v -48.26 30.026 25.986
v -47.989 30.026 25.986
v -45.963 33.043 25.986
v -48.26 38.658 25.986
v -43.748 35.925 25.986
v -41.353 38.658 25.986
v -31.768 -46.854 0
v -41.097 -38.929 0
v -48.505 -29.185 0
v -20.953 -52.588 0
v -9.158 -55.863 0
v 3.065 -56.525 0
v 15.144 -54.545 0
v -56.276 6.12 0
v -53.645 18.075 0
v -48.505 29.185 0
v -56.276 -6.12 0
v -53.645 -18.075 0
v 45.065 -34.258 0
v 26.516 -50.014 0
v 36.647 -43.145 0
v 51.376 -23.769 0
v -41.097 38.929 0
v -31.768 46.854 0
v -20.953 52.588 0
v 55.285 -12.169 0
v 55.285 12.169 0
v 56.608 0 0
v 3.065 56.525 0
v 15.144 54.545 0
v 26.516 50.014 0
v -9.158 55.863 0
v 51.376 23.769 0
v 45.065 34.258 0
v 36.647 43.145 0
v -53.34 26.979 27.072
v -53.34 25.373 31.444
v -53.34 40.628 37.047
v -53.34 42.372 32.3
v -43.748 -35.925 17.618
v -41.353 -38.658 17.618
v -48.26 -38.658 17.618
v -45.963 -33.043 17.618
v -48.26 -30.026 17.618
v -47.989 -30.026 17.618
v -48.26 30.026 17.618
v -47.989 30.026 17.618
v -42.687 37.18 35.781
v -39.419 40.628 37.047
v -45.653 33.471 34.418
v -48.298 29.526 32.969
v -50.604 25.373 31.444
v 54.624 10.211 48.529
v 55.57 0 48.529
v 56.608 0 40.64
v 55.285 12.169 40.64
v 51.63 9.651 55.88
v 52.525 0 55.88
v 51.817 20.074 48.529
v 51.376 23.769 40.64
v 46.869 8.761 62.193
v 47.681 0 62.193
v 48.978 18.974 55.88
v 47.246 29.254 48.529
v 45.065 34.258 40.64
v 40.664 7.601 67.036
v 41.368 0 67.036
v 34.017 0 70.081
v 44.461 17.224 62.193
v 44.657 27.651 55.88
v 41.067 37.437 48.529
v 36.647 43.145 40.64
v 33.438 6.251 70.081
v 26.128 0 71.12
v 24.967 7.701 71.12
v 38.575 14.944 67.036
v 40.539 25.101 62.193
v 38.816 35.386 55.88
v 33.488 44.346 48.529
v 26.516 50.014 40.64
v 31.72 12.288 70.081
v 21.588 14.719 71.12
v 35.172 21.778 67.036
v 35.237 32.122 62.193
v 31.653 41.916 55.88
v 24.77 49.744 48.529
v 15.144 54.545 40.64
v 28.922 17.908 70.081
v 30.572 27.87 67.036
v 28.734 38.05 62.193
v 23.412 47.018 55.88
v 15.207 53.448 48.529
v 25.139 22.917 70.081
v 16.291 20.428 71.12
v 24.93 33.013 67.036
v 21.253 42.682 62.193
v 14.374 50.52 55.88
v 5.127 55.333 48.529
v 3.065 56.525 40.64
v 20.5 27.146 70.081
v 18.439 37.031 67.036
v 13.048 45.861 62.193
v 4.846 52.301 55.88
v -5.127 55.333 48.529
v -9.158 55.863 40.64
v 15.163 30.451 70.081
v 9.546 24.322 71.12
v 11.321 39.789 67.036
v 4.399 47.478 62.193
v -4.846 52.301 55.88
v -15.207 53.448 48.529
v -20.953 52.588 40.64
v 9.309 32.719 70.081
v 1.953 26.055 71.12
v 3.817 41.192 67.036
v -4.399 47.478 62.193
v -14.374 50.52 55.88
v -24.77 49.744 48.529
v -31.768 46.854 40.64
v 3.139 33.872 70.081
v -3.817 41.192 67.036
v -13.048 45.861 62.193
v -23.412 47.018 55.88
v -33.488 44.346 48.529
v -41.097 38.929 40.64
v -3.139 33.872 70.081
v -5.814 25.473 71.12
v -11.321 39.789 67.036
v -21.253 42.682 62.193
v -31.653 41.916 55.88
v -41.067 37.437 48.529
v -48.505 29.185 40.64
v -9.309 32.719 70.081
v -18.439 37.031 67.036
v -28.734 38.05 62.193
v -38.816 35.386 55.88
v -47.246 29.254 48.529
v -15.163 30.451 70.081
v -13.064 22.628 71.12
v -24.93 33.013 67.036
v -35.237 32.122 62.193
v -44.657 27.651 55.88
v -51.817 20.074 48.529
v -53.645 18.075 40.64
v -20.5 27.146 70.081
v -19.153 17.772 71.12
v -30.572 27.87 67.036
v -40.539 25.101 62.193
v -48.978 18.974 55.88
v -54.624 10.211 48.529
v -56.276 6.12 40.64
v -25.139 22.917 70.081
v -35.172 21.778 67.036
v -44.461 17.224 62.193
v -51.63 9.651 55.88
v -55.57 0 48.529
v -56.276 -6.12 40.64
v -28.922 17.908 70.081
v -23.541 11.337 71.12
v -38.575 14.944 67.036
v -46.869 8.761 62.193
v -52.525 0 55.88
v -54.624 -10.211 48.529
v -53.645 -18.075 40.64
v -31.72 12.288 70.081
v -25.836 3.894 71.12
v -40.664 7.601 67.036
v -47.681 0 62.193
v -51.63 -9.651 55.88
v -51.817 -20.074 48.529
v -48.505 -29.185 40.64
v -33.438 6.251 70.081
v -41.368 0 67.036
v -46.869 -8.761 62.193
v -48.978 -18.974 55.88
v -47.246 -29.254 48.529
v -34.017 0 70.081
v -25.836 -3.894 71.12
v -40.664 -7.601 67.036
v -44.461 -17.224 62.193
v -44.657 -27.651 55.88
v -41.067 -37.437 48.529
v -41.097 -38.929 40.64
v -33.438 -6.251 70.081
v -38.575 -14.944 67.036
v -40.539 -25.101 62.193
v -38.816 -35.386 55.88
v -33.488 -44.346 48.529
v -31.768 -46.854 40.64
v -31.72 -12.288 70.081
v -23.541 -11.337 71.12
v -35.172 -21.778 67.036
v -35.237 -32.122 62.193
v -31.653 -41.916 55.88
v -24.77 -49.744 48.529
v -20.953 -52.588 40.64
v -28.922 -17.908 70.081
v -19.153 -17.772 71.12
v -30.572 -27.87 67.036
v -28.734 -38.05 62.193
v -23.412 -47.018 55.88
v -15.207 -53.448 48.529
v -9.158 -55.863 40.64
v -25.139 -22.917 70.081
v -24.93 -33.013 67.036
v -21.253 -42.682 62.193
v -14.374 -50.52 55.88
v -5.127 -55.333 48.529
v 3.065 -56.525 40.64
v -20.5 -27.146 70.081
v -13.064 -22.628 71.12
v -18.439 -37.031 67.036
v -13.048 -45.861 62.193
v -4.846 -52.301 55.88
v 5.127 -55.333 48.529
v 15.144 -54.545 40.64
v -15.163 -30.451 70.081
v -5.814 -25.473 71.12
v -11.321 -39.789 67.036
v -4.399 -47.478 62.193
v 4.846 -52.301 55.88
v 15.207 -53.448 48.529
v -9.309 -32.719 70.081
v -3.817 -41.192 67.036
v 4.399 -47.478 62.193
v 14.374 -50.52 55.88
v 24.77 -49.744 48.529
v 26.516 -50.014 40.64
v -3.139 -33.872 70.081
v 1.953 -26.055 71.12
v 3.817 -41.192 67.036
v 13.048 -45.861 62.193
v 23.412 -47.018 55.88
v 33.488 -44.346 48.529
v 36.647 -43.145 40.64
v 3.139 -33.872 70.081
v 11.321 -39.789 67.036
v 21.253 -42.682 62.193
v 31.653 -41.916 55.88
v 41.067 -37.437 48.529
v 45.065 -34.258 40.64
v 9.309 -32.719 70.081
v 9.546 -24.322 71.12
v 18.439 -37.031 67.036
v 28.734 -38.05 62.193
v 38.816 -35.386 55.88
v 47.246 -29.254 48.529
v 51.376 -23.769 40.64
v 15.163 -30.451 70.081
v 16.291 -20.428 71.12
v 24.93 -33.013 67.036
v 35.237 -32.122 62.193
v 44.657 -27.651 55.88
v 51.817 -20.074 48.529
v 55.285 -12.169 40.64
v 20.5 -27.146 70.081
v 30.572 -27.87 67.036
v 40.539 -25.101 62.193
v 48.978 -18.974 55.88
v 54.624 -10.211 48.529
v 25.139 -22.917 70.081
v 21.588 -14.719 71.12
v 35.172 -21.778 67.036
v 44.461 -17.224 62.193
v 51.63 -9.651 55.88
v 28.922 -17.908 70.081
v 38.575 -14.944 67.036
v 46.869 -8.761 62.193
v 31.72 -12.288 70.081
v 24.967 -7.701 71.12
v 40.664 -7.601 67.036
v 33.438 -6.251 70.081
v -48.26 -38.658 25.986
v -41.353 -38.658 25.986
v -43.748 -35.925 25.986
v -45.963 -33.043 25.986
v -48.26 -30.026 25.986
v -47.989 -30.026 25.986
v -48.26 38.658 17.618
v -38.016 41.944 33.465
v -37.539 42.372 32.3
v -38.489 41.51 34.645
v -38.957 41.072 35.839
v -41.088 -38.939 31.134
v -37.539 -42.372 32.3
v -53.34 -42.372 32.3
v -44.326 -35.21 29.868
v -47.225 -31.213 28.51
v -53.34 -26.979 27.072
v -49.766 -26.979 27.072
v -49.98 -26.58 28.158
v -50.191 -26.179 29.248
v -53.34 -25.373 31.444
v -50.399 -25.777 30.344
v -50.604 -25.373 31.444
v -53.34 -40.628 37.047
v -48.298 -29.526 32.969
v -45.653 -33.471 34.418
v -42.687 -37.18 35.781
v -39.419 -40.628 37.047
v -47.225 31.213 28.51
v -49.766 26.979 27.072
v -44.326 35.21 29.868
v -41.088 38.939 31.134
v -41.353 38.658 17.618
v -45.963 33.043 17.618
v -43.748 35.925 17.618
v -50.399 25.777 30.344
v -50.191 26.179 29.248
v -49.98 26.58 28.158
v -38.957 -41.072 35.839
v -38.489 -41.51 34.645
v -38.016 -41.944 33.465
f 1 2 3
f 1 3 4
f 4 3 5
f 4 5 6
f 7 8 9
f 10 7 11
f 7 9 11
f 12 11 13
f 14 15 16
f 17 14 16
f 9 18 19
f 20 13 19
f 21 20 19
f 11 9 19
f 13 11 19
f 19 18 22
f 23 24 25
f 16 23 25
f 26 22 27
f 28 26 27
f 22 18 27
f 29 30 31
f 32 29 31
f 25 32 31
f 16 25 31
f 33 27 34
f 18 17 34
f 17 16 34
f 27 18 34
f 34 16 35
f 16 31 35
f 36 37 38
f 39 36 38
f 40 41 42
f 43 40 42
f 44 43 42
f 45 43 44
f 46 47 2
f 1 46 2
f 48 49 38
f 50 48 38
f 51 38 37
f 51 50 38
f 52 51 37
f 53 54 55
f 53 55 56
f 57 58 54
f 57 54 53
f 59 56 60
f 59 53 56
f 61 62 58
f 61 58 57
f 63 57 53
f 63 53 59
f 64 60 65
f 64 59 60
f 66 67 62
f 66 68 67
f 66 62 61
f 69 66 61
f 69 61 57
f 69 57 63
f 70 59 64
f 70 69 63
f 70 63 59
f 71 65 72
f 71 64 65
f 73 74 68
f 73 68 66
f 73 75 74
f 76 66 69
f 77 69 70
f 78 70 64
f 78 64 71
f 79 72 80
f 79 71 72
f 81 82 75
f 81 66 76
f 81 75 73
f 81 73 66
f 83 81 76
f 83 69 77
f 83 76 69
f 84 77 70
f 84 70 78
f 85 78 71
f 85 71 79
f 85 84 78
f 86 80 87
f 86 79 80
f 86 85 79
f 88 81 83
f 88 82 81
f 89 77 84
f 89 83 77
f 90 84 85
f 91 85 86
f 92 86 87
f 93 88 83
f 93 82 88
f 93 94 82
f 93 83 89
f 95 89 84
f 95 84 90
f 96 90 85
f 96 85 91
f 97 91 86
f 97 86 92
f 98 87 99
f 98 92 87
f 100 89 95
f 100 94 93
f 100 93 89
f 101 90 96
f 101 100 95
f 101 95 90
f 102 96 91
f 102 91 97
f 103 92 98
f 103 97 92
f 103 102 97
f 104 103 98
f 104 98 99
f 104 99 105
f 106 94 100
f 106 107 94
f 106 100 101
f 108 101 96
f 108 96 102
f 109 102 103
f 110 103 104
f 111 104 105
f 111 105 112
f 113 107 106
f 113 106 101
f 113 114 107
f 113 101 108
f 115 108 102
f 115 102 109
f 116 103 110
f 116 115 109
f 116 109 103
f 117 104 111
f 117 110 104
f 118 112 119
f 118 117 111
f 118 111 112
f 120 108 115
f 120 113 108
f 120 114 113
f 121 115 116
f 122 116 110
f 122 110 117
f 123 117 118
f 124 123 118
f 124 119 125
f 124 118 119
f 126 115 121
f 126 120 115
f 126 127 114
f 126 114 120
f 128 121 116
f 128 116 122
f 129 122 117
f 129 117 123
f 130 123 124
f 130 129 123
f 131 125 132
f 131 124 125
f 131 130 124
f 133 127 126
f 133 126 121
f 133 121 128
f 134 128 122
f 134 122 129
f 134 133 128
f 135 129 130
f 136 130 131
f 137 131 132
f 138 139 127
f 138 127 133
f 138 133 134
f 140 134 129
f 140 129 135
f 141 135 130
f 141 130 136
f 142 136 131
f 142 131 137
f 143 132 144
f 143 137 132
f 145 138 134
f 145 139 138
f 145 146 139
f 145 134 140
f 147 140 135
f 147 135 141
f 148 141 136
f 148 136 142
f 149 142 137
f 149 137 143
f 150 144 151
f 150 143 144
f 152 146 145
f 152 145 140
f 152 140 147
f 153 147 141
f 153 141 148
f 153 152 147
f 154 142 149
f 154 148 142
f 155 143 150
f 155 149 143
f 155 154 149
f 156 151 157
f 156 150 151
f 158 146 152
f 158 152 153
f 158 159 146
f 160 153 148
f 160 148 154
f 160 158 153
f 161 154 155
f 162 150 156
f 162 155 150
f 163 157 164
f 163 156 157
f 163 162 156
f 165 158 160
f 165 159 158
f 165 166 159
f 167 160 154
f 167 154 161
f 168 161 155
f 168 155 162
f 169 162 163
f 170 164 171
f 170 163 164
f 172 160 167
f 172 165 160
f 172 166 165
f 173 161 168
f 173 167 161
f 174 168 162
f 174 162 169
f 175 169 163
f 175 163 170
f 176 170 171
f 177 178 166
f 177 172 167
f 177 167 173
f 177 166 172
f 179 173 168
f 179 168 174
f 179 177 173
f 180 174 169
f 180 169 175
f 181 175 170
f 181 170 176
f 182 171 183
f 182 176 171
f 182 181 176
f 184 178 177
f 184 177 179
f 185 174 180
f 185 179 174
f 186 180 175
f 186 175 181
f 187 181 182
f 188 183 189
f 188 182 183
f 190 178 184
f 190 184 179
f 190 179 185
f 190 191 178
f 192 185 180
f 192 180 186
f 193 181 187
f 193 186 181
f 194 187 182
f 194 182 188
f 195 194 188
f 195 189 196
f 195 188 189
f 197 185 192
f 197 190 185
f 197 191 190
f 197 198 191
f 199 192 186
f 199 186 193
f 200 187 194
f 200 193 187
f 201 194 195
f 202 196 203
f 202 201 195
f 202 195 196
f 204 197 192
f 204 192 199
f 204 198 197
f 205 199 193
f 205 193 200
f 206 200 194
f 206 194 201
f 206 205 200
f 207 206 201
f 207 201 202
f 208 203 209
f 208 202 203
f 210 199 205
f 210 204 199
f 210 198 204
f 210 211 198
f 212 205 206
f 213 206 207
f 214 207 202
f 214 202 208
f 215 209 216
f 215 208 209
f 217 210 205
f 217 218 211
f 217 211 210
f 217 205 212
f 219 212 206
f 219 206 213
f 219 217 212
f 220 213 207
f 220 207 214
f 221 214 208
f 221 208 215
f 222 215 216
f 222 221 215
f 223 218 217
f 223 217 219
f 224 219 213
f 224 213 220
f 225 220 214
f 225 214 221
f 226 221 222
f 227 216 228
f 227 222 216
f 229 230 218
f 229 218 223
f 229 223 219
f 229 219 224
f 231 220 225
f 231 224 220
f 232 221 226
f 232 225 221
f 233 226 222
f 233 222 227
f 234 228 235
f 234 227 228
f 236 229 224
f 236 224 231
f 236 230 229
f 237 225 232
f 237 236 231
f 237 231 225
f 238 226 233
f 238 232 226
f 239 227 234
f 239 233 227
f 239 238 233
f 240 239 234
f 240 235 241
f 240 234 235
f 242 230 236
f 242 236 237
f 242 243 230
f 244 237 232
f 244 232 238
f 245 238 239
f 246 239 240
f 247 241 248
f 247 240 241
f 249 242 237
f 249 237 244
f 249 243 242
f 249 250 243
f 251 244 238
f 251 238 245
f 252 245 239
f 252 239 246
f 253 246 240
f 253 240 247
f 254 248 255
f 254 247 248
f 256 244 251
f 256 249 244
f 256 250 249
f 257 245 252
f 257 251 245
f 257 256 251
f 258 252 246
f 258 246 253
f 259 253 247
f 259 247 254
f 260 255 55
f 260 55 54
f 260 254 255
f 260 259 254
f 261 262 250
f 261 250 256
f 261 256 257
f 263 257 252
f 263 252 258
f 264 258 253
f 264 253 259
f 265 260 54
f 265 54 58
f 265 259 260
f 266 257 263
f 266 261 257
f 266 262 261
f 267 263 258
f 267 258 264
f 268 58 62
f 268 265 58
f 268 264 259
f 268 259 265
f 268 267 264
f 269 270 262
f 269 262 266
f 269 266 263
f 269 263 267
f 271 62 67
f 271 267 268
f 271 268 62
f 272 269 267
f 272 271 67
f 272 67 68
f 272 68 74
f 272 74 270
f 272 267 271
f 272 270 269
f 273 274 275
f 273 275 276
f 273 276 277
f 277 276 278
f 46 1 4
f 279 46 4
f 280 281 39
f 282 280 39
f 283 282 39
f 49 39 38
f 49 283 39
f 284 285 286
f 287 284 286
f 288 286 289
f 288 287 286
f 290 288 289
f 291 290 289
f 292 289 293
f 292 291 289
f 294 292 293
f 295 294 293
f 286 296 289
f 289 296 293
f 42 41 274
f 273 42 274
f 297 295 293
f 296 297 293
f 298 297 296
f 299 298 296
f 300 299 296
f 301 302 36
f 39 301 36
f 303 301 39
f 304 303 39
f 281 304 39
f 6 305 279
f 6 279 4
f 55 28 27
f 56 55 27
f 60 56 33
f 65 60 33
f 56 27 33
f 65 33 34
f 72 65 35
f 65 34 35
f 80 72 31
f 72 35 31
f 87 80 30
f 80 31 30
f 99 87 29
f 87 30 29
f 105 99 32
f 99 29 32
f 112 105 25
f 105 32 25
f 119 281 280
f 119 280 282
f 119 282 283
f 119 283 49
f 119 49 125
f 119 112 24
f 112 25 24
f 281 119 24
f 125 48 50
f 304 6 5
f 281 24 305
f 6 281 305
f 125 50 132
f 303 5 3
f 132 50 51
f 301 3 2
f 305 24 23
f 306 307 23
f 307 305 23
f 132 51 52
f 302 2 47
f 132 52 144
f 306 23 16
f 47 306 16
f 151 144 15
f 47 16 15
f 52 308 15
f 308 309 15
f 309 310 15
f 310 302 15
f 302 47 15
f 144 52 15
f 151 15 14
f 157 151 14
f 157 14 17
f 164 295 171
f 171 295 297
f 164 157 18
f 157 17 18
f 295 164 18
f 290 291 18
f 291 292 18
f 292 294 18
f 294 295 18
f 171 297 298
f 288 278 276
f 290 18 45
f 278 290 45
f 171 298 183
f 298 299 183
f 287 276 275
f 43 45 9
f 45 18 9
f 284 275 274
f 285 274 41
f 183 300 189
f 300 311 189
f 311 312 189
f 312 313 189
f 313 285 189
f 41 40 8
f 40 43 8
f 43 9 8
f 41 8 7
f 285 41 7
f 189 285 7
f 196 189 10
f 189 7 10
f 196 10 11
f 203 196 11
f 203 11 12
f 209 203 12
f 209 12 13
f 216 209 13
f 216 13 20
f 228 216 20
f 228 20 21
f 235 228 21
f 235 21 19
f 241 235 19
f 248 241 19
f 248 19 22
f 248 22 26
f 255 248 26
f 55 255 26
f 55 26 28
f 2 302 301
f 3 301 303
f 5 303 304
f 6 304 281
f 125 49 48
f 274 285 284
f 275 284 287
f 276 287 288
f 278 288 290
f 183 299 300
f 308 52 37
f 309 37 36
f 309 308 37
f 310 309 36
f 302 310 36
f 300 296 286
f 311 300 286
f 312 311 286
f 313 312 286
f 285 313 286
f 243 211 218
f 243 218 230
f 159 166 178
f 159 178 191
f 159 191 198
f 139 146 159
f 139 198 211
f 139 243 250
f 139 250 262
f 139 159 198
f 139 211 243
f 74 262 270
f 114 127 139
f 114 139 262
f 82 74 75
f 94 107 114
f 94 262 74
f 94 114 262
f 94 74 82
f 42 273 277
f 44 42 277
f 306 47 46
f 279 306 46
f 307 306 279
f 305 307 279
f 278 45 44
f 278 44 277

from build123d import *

# Parameters (mm, degrees)
F0_R     = 56.608289
F1_DEPTH = 71.12
F2_R     = 30.48
F3_W     = 8.632271
F3_H     = 8.368614
F4_DEPTH = 48.26
F6_DEPTH = 53.34


with BuildPart() as f1:
    # F0 (on Top) → F1 (new body)
    with BuildSketch(Plane.XY):
        Circle(F0_R)
    extrude(amount=F1_DEPTH)

    # F2
    f2_edges = [f1.edges().sort_by_distance(p)[0] for p in [
        (-56.608289, 0, 71.12),
    ]]
    fillet(f2_edges, radius=F2_R)

    # F3 (on Right) → F4 (join)
    with BuildSketch(Plane.YZ):
        with Locations((34.341916, 21.801914)):
            Rectangle(F3_W, F3_H)
        with Locations((-34.341916, 21.801914)):
            Rectangle(F3_W, F3_H)
    extrude(amount=-F4_DEPTH)

    # F5 (on Right) → F6 (join)
    with BuildSketch(Plane.YZ):
        Polygon((42.371512, 32.300244), (40.627647, 37.047431), (25.372822, 31.443618), (26.978905, 27.071502), align=None)
        Polygon((-26.978905, 27.071502), (-25.372822, 31.443618), (-40.627647, 37.047431), (-42.371512, 32.300244), align=None)
    extrude(amount=-F6_DEPTH)


solid = f1.part
